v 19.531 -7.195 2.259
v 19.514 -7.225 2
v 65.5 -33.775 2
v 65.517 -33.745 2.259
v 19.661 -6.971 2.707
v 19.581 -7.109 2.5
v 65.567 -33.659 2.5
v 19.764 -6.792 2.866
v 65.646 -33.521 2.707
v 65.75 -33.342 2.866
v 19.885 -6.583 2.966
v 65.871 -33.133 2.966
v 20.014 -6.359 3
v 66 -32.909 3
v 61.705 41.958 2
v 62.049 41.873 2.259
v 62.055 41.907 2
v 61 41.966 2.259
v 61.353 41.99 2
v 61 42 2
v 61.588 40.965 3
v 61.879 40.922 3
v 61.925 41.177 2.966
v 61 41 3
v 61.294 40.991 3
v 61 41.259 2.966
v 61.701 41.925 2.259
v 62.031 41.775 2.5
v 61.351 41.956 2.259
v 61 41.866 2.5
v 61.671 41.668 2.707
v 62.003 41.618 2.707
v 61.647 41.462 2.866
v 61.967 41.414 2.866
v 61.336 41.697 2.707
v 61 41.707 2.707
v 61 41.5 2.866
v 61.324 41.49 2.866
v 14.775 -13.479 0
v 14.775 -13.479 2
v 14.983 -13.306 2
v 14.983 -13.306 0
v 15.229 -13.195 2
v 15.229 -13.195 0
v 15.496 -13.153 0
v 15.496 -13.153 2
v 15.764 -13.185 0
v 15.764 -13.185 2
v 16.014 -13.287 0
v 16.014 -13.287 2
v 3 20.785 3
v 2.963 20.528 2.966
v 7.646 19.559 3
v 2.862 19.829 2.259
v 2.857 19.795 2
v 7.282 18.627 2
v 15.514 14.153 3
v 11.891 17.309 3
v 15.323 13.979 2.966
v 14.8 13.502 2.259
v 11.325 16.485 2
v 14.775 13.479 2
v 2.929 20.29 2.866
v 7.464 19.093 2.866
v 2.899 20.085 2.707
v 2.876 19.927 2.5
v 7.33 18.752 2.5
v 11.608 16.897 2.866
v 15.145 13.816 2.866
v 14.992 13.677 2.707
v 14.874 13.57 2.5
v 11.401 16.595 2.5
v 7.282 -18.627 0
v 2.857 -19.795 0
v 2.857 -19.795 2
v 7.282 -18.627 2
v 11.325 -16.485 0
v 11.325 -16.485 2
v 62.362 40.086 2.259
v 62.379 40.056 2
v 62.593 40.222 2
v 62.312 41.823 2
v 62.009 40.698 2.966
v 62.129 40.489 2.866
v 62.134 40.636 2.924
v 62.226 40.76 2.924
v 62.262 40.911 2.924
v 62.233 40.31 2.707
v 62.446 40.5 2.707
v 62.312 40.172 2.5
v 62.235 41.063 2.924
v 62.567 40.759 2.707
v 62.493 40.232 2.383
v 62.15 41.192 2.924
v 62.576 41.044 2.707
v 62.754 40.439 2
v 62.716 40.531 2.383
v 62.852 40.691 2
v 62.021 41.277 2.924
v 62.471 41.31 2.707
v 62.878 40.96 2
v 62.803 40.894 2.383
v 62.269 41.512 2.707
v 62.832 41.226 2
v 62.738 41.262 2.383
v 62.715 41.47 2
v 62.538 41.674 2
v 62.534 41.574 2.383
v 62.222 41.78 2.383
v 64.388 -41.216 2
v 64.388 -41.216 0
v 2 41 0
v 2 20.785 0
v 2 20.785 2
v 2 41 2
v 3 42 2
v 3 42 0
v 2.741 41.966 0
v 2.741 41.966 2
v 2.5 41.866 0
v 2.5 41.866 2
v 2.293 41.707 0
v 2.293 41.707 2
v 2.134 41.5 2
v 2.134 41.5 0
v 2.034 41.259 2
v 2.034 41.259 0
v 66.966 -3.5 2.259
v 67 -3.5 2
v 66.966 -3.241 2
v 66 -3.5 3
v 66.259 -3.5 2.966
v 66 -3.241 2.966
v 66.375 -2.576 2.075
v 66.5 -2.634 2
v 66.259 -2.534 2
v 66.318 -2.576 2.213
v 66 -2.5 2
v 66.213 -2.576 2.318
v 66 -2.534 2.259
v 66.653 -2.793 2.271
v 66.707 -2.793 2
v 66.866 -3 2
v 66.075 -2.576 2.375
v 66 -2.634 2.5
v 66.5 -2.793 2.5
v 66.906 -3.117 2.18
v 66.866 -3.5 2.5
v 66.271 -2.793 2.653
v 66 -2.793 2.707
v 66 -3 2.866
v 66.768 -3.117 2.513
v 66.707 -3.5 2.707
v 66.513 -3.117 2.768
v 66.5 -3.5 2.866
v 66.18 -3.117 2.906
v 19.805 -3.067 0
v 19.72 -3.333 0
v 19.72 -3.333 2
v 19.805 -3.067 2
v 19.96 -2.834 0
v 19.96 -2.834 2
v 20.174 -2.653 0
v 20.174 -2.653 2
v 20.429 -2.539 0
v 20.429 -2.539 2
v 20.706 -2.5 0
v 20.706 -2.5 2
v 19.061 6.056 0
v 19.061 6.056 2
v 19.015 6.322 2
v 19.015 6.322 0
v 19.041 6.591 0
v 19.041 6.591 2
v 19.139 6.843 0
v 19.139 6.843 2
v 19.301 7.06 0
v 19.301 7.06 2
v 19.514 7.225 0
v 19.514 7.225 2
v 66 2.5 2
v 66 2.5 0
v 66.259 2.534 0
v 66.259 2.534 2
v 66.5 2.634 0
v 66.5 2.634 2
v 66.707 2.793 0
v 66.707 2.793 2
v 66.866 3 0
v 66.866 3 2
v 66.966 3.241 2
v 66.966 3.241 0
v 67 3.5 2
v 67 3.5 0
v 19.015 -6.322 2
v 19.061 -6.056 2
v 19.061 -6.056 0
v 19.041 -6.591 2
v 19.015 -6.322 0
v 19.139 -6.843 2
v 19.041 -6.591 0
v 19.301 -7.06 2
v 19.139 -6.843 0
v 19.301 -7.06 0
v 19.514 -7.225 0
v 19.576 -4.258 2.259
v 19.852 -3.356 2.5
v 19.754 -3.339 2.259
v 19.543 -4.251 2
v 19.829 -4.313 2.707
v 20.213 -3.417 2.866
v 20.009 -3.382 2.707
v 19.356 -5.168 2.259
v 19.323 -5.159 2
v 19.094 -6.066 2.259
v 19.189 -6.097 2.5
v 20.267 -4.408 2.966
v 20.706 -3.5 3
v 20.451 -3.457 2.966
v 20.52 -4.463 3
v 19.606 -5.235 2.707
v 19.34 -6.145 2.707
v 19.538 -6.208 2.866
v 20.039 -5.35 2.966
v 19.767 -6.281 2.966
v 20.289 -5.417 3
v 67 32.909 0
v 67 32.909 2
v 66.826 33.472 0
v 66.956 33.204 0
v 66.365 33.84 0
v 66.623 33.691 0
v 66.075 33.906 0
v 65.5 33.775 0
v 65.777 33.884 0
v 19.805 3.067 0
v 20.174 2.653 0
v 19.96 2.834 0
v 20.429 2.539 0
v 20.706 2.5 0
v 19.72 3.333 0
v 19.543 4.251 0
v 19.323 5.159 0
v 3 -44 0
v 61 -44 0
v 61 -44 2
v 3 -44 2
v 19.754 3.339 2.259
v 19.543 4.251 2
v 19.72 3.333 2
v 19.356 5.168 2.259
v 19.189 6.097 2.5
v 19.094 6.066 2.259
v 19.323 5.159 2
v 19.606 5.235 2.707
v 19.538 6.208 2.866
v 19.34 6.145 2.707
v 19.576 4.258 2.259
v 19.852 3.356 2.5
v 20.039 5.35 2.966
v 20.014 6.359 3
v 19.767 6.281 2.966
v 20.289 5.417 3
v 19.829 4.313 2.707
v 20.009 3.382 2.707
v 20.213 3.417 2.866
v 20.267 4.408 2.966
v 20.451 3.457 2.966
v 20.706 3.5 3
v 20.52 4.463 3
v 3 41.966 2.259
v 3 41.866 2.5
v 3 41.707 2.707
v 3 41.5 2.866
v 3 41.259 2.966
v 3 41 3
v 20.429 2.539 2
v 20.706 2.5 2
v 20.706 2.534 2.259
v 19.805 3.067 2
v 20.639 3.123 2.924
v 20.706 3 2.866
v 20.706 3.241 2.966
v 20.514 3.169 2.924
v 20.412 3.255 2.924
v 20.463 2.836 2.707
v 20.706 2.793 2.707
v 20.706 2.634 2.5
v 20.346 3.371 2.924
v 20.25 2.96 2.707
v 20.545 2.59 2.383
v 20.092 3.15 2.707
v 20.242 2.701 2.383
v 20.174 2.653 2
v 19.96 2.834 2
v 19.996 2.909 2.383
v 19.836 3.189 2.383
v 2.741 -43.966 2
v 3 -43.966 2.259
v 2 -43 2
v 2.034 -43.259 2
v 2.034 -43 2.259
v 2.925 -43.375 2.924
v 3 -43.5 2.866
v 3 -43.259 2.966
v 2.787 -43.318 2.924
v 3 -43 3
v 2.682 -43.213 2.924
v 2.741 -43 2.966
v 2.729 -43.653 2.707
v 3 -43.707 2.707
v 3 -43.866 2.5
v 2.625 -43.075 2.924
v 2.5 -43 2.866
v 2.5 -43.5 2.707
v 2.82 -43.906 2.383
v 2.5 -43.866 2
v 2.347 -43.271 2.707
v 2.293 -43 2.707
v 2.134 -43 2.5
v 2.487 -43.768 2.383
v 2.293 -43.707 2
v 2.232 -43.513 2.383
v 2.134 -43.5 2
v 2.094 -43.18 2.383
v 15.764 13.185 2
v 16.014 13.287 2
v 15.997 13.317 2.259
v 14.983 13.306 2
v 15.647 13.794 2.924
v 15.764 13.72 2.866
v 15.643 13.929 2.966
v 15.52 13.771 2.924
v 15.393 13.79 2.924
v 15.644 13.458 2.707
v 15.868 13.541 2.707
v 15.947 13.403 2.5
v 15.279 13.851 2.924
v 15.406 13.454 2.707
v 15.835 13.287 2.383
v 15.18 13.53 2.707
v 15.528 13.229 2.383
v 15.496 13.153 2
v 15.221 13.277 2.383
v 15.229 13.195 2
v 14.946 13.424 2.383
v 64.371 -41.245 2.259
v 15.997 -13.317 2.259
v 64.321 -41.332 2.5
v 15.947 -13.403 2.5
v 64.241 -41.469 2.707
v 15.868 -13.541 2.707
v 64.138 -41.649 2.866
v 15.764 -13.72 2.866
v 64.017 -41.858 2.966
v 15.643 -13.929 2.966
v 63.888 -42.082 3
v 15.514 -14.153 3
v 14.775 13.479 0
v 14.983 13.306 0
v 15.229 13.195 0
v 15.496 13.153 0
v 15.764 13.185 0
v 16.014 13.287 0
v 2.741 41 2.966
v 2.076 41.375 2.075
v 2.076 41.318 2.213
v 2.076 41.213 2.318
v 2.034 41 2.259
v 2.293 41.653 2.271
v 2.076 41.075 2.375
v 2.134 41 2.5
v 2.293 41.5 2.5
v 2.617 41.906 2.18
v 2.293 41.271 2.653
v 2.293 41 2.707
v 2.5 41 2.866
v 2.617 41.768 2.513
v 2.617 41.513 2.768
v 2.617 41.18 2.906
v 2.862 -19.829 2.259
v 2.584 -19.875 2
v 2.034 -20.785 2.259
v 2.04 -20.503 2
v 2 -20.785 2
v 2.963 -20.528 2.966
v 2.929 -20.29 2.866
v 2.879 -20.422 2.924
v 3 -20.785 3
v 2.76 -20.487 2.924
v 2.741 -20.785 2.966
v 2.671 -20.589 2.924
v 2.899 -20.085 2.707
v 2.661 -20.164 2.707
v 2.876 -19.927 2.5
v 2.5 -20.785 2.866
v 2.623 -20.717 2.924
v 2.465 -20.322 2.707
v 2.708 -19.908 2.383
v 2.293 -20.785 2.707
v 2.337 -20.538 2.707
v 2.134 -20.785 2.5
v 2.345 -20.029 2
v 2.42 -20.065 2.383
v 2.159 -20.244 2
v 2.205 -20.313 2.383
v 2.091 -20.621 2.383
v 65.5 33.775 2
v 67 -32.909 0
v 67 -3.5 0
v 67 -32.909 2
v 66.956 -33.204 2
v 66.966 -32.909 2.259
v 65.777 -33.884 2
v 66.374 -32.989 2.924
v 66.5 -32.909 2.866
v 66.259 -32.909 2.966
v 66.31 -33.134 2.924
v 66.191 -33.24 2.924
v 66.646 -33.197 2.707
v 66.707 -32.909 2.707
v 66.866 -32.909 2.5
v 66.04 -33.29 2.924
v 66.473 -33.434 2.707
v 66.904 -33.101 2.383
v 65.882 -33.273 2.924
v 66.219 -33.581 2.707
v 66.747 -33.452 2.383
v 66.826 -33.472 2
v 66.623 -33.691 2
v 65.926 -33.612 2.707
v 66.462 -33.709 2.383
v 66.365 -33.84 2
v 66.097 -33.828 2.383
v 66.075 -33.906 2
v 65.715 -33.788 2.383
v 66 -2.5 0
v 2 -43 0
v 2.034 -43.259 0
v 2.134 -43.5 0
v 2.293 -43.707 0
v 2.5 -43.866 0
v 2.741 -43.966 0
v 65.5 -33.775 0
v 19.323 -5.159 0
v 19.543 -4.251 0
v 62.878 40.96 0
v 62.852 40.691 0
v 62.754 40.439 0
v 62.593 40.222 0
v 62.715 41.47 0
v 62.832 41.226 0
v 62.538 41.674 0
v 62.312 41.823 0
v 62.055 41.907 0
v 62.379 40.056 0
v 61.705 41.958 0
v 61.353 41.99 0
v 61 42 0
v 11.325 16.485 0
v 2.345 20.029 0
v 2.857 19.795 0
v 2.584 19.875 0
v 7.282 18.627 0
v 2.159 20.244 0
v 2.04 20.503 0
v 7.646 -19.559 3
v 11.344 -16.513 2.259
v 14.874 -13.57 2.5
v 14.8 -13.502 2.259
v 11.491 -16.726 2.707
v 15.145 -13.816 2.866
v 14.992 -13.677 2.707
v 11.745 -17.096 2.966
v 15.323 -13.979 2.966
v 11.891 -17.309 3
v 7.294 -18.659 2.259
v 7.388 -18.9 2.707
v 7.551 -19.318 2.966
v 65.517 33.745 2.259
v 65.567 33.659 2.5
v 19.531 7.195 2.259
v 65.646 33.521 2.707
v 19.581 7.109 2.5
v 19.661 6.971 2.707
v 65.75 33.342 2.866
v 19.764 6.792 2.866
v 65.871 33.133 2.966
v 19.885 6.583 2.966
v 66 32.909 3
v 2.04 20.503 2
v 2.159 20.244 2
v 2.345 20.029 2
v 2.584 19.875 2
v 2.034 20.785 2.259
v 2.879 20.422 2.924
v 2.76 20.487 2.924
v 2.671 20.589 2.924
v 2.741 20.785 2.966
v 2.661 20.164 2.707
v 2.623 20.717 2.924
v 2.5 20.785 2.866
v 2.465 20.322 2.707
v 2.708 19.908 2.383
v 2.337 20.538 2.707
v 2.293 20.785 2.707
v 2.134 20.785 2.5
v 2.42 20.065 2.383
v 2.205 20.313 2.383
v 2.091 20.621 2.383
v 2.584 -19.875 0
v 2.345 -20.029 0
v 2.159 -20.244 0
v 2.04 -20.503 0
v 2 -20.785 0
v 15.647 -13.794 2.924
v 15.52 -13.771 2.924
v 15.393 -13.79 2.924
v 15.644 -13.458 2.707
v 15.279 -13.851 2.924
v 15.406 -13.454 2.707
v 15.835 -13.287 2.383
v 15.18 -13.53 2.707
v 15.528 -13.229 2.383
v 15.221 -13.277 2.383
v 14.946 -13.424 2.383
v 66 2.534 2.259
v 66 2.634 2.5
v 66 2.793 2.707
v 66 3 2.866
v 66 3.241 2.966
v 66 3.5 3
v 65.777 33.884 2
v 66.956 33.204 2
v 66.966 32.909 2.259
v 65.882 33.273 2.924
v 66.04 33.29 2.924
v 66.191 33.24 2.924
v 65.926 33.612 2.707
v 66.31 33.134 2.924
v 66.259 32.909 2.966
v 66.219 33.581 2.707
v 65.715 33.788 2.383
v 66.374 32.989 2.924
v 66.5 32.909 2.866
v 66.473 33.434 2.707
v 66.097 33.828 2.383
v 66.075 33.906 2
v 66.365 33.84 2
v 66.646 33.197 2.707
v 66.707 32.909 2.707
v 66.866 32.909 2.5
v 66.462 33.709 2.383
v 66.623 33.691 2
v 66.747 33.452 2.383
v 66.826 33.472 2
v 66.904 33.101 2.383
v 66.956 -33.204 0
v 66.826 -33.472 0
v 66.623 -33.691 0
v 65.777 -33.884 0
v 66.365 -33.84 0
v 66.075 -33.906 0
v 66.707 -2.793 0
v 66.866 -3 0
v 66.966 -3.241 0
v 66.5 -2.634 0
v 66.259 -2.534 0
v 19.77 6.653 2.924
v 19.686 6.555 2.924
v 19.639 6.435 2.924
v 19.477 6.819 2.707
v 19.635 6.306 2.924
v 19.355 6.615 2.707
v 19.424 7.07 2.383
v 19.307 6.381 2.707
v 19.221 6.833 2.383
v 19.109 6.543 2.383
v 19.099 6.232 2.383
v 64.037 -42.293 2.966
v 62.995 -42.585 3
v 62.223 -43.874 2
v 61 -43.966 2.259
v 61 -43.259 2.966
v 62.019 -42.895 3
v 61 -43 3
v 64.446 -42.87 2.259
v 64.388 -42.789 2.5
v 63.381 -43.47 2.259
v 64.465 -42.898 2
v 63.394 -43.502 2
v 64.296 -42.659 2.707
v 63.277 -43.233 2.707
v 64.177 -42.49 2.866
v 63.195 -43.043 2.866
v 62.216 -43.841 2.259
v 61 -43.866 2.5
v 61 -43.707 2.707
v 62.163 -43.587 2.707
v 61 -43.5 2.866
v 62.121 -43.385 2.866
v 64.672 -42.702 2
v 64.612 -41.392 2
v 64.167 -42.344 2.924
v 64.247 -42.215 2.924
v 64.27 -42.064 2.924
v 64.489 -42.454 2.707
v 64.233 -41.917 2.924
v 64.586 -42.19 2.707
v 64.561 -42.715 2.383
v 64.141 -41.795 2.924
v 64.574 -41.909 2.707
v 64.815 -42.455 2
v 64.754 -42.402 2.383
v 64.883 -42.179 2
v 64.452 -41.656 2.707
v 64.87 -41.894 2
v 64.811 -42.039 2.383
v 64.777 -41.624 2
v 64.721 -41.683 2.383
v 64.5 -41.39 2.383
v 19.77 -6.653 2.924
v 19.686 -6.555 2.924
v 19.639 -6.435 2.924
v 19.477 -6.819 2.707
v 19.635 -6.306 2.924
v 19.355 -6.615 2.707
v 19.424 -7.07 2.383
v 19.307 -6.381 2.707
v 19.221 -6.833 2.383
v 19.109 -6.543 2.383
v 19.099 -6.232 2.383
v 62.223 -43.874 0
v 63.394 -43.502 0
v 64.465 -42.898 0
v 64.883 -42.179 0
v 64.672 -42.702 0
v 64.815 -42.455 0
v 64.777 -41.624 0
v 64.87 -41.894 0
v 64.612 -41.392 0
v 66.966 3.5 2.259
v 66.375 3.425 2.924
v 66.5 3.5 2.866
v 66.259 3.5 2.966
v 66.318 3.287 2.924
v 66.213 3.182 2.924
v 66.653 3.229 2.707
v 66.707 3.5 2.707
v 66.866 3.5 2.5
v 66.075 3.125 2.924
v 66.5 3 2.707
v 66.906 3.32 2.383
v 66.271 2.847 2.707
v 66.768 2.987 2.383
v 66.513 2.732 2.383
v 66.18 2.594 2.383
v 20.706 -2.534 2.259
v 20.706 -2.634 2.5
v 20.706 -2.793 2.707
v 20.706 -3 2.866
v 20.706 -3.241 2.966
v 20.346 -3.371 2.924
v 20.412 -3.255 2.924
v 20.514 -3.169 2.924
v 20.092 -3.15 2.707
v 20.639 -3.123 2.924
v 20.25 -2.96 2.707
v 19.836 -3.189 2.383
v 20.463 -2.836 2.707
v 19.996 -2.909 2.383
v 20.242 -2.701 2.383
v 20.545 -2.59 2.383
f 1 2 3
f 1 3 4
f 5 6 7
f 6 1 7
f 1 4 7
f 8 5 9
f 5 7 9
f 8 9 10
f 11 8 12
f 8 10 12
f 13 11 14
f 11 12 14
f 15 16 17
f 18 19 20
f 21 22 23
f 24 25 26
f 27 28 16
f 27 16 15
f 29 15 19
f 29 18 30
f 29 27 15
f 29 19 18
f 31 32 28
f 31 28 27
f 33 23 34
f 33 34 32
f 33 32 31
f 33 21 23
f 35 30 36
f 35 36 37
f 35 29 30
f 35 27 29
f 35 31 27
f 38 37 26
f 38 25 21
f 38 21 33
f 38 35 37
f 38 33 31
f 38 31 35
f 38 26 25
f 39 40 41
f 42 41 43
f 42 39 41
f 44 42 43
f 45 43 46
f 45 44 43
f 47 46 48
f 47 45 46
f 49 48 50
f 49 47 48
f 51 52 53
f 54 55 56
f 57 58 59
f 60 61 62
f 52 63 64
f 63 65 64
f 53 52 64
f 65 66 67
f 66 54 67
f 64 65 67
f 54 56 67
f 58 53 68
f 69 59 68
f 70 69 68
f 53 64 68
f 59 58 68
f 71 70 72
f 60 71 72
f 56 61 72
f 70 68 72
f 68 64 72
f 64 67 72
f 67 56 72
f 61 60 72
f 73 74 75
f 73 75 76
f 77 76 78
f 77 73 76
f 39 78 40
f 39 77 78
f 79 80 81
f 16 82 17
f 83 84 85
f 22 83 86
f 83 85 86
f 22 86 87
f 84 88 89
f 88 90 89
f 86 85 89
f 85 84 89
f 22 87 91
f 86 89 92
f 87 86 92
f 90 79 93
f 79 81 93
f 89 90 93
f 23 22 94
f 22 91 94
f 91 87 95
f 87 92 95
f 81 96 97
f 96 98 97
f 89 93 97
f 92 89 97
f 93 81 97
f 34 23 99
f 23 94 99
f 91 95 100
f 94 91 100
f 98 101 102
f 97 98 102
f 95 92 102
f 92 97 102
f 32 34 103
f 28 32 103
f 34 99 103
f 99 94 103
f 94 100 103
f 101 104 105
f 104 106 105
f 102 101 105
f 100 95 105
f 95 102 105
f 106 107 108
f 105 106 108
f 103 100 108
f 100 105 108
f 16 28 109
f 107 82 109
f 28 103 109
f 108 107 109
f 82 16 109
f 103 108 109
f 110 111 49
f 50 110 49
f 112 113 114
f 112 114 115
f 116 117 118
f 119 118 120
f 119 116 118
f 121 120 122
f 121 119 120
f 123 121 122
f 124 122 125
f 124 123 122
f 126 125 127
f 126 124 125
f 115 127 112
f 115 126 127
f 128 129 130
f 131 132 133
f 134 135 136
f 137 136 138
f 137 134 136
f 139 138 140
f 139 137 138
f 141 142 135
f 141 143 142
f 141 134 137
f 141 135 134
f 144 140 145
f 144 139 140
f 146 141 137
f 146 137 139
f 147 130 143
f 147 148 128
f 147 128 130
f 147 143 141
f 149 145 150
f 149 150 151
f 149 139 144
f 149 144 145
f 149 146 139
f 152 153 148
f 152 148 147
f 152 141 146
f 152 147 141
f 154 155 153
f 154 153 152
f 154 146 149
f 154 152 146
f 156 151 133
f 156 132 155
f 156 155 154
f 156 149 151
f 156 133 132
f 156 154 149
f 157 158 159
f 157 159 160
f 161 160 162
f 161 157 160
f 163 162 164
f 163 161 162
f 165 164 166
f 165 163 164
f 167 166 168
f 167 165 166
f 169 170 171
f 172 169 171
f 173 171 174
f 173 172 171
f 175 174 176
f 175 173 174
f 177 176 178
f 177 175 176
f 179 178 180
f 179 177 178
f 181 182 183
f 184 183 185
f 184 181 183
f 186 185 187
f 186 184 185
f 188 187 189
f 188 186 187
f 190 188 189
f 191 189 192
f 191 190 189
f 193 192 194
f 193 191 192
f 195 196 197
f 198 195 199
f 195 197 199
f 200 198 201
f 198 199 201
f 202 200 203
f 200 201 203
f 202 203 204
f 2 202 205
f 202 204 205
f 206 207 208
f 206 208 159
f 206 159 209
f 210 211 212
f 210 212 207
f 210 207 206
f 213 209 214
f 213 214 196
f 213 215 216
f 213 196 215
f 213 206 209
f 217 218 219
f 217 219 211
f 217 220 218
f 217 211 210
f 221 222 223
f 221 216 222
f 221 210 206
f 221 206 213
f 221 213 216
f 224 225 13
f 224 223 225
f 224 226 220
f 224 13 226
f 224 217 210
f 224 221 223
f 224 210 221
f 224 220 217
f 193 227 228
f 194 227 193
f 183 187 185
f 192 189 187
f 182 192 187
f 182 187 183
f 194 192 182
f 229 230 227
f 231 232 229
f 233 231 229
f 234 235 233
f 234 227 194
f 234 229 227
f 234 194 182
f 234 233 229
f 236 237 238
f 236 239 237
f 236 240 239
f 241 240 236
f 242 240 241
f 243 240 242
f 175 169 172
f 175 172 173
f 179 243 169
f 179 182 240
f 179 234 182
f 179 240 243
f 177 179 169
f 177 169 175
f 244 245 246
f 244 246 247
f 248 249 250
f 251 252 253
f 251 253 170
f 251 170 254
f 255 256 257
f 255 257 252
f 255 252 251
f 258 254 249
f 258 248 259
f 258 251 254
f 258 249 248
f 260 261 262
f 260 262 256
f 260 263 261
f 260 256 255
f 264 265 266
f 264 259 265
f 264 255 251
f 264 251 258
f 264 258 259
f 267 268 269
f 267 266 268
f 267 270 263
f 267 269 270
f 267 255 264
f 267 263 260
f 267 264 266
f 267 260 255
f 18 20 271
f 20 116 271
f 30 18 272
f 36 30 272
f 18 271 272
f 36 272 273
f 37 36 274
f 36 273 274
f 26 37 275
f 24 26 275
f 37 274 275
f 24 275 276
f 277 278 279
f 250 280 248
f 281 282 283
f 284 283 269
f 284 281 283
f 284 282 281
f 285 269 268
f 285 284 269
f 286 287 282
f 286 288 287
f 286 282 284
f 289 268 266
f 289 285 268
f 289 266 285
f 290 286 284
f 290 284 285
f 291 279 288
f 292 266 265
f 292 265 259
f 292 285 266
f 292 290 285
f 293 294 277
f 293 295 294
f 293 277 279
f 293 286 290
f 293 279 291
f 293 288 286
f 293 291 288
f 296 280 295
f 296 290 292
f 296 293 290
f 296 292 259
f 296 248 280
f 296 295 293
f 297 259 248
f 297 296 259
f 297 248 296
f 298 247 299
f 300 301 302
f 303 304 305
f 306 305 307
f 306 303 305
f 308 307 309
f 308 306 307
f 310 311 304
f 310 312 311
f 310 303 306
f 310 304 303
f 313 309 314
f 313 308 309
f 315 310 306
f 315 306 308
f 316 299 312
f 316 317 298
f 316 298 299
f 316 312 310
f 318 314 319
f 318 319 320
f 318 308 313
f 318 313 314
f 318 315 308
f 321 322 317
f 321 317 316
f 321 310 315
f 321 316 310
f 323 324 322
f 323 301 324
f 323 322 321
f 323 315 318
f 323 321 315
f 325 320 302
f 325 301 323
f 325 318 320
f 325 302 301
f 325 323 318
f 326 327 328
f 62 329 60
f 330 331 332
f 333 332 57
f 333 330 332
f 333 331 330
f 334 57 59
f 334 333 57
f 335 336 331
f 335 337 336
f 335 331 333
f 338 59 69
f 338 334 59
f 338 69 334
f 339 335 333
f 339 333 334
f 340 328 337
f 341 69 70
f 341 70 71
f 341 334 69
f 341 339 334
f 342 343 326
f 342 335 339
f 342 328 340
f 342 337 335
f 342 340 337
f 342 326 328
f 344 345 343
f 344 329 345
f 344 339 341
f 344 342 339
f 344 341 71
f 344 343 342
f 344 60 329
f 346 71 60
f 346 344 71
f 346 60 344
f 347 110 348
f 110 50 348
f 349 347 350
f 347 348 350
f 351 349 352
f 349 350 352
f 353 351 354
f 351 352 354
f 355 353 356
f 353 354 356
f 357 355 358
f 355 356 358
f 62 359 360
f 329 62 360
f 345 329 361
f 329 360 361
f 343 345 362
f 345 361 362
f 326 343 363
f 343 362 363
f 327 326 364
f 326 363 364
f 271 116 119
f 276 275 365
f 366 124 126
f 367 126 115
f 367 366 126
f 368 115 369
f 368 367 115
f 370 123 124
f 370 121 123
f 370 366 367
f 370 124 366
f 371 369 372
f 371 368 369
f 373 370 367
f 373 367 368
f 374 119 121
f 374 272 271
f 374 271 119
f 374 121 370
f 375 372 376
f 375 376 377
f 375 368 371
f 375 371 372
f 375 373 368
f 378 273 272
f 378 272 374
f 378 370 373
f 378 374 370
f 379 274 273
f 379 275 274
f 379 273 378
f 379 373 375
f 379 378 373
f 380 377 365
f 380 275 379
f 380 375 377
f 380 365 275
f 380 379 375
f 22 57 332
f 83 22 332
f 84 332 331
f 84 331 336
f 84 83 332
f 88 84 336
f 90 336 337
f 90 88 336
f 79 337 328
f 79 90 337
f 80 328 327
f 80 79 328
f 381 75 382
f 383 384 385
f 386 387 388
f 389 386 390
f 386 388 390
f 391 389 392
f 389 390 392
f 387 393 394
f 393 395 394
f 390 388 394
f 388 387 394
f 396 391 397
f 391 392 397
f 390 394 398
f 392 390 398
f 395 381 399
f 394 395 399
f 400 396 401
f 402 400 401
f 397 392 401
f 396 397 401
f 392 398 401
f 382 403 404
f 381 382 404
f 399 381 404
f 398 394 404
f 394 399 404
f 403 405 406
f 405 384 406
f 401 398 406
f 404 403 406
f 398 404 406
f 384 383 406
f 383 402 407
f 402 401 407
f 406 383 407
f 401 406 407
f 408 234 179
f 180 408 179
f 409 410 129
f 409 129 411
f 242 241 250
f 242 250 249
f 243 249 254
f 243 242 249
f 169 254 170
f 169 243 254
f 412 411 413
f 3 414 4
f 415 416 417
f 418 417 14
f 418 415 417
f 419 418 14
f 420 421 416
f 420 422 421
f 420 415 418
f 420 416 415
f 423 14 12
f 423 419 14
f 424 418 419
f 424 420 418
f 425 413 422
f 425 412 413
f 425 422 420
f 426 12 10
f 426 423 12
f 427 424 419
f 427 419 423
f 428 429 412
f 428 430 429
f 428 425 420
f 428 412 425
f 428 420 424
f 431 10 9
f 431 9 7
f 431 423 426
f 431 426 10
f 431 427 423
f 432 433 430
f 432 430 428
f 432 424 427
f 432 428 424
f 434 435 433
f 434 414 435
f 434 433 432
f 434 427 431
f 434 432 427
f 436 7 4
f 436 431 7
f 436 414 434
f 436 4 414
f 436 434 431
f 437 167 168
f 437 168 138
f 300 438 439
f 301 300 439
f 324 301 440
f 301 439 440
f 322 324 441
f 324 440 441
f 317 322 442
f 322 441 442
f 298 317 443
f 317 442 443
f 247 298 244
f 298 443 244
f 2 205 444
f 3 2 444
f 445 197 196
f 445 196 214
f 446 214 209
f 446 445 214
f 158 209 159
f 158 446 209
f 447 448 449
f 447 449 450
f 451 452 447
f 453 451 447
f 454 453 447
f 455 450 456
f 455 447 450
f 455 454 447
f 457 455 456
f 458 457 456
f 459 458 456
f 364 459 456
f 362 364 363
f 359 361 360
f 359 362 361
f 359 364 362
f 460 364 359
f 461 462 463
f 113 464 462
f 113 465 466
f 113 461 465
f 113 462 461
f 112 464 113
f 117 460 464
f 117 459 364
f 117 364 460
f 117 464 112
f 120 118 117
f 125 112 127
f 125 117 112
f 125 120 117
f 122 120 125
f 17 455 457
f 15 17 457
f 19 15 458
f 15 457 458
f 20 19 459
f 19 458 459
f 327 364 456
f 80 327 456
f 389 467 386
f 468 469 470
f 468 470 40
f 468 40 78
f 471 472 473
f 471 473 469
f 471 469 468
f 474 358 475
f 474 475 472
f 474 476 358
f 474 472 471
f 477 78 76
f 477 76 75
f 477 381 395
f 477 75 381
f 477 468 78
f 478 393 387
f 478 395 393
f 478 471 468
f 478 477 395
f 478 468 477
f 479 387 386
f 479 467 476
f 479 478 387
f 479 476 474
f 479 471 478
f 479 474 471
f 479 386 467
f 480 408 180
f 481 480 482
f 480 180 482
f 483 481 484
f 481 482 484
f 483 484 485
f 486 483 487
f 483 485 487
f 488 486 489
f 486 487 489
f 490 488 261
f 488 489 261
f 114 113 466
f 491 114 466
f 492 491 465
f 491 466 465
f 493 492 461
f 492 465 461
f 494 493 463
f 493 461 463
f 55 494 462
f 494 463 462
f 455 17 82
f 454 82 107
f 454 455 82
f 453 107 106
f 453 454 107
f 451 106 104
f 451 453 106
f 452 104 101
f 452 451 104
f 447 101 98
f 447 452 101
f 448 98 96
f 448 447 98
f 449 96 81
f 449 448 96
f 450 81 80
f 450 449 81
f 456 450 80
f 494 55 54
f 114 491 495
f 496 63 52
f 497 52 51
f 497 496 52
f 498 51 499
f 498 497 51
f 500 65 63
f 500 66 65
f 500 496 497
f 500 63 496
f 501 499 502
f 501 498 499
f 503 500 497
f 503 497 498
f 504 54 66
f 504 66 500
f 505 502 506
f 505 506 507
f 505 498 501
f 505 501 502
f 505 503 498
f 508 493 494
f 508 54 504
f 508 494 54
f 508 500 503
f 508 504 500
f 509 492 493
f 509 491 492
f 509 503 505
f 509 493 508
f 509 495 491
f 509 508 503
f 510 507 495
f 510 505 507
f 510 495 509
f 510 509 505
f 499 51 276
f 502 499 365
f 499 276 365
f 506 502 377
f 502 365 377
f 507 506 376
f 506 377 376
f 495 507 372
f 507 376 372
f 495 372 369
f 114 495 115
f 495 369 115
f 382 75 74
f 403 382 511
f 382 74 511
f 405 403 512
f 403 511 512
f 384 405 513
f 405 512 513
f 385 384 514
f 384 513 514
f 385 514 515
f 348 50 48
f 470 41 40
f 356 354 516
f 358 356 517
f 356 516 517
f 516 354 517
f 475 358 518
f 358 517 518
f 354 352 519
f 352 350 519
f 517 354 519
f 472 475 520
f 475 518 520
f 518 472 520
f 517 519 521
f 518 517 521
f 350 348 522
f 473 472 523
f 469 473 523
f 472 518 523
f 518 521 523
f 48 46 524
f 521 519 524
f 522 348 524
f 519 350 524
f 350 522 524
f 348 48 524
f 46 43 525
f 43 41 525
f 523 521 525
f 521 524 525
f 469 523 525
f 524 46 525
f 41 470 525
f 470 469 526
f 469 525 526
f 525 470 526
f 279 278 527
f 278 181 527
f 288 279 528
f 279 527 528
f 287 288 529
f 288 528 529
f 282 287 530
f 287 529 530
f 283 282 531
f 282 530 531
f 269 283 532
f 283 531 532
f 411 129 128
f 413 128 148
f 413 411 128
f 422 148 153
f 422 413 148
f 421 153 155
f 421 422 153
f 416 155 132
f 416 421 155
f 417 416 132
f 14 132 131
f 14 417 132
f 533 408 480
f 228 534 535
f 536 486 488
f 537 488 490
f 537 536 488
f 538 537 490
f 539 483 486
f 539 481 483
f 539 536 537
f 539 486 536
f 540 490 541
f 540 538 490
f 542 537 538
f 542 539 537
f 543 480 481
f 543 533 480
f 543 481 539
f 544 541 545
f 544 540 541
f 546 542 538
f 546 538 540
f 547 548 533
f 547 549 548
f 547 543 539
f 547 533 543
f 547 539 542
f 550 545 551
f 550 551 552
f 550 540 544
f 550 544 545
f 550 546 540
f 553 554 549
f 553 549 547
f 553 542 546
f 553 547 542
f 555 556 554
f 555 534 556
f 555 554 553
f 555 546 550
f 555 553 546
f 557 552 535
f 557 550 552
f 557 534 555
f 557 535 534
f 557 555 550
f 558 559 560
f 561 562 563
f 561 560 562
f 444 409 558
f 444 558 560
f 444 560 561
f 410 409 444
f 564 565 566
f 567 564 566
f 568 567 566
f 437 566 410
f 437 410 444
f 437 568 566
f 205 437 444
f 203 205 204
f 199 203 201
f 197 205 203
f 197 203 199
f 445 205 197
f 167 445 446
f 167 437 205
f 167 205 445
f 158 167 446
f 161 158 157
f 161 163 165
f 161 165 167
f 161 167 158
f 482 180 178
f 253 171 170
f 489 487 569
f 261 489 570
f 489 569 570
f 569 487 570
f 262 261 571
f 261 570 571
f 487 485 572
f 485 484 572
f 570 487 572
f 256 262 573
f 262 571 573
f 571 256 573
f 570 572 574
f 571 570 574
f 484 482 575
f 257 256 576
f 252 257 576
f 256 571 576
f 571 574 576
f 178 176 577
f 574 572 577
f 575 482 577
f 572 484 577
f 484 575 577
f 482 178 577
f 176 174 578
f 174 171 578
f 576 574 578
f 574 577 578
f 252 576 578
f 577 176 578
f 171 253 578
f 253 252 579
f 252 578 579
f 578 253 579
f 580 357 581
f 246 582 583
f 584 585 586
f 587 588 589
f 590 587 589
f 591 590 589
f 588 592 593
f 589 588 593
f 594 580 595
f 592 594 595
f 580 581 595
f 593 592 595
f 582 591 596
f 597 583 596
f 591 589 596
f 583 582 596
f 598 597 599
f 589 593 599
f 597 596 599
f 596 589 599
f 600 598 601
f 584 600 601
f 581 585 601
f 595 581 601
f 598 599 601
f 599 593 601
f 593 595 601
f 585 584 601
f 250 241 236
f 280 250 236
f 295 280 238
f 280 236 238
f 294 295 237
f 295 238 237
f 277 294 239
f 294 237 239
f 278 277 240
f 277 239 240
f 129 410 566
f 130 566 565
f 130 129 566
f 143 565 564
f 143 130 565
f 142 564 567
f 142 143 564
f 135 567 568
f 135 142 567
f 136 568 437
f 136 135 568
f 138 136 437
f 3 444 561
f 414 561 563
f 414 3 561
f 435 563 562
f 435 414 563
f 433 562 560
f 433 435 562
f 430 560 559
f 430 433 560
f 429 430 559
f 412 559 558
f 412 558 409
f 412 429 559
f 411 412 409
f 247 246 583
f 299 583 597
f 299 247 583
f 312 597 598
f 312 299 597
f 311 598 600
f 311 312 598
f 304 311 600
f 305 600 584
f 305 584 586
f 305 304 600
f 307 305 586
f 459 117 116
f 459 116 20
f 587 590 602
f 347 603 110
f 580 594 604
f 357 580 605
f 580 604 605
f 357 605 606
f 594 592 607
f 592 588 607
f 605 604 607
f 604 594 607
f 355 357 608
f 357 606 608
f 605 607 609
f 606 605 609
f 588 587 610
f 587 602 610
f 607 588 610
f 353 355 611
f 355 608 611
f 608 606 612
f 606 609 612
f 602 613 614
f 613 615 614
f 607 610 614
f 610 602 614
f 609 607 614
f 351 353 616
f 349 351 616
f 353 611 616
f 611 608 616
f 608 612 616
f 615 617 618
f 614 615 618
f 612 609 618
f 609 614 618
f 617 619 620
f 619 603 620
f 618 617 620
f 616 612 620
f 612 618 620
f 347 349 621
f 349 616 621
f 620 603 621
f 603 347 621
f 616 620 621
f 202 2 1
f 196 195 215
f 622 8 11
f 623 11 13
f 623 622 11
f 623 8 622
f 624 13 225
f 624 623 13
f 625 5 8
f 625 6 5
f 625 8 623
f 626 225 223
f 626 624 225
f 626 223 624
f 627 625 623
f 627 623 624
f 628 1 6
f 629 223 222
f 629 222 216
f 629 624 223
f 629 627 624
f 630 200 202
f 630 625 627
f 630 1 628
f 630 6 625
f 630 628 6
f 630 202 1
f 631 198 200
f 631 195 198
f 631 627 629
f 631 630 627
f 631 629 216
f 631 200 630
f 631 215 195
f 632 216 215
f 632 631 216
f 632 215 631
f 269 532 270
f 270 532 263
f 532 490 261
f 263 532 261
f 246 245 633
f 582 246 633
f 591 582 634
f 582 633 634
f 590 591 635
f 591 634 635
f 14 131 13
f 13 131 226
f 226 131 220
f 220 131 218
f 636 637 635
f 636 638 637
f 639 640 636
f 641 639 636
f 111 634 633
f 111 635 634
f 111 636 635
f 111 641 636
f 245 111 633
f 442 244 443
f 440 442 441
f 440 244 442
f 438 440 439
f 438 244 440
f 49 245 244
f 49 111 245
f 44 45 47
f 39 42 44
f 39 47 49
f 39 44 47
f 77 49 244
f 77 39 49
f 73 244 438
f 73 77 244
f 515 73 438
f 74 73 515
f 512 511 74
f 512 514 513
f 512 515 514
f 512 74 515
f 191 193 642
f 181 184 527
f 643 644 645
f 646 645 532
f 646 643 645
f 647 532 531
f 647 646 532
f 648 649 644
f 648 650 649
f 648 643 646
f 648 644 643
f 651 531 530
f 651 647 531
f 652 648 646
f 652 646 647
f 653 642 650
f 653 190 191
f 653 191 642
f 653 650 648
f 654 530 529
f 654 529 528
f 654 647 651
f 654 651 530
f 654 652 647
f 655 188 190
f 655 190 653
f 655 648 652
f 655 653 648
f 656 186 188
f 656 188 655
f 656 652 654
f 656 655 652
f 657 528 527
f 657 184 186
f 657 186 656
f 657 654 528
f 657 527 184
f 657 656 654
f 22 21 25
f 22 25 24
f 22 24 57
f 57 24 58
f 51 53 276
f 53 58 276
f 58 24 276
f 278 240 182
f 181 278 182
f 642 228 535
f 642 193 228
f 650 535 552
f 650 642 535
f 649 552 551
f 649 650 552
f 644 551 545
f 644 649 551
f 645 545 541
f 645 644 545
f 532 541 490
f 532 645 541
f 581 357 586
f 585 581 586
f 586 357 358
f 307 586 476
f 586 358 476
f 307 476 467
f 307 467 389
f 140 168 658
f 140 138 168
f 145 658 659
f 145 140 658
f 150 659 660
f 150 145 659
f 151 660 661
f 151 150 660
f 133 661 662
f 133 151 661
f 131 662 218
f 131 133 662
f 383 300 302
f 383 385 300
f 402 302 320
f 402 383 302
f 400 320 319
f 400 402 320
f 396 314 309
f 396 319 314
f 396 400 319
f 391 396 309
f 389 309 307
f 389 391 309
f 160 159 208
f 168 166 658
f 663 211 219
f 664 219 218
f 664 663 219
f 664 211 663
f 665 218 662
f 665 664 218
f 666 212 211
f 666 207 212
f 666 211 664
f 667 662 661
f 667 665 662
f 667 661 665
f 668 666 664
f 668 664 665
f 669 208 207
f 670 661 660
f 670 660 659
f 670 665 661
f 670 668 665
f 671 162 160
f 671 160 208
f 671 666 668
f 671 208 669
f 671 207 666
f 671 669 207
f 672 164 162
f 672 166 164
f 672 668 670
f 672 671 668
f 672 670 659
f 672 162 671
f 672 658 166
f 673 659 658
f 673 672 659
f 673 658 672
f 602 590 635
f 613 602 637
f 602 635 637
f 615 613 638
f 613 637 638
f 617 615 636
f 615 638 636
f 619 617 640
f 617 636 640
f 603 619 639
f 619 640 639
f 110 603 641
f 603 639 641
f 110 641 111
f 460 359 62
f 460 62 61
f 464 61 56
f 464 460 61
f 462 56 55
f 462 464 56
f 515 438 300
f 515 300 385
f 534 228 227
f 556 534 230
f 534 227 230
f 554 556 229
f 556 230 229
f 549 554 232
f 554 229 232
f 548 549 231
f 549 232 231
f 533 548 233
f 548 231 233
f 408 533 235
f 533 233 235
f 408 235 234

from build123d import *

# Parameters (mm, degrees)
SKETCH007_W   = 2
SKETCH007_H   = 82
SKETCH007_W_2 = 81.968745
SKETCH007_H_2 = 5
PAD008_DEPTH  = 10
SKETCH009_R   = 20
PAD007_DEPTH  = 10
PAD006_DEPTH  = 3
FILLET002_R   = 1


with BuildPart() as mr_ribs001:
    # Sketch007 → Pad008 (new body)
    with BuildSketch(Plane.XY):
        with Locations((1, 59)):
            Rectangle(SKETCH007_W, SKETCH007_H)
        Polygon((13.540929, 11.859311), (84.79948, 53.000455), (88.29948, 46.938277), (17.040929, 5.797133), align=None)
        with Locations((58.984372, 0)):
            Rectangle(SKETCH007_W_2, SKETCH007_H_2)
        Polygon((17.040929, -5.797133), (88.29948, -46.938277), (84.79948, -53.000455), (13.540929, -11.859311), align=None)
        with Locations((1, -59)):
            Rectangle(SKETCH007_W, SKETCH007_H)
    extrude(amount=PAD008_DEPTH)


with BuildPart() as mr_lens001:
    # Sketch009 → Pad007 (new body)
    with BuildSketch(Plane.XY):
        Circle(SKETCH009_R)
    extrude(amount=PAD007_DEPTH)


with BuildPart() as mr_tool:
    # Sketch008 → Pad006 (new body)
    with BuildSketch(Plane.XY):
        with BuildLine():
            Line((0, 42), (61, 42))
            ThreePointArc((67, 36), (65.242641, 40.242641), (61, 42))
            Line((67, 36), (67, -38))
            ThreePointArc((61, -44), (65.242641, -42.242641), (67, -38))
            Line((61, -44), (0, -44))
            Line((0, -44), (0, 42))
        make_face()
    extrude(amount=PAD006_DEPTH)

    # Cut001: cut MR_Lens001
    add(mr_lens001.part, mode=Mode.SUBTRACT)

    # Cut002: cut MR_Ribs001
    add(mr_ribs001.part, mode=Mode.SUBTRACT)

    # Fillet002
    fillet002_edges = [mr_tool.edges().sort_by_distance(p)[0] for p in [
        (2, -44, 1.5),
        (31.5, -44, 3),
        (2, -31.949874, 3),
        (2, -19.899749, 1.5),
        (63.513057, -43.448353, 3),
        (40.433616, -27.385811, 3),
        (9.337074, -17.686691, 3),
        (65.564006, -41.894849, 1.5),
        (15.303226, -12.876773, 1.5),
        (67, -34.641016, 1.5),
        (67, -18.570508, 3),
        (67, -2.5, 1.5),
        (43.421567, -2.5, 3),
        (19.843135, -2.5, 1.5),
        (19.443231, -4.686232, 3),
        (18.803226, -6.814595, 1.5),
        (42.901613, -20.727806, 3),
        (67, 2.5, 1.5),
        (67, 18.570508, 3),
        (67, 34.641016, 1.5),
        (18.803226, 6.814595, 1.5),
        (42.901613, 20.727806, 3),
        (19.443231, 4.686232, 3),
        (19.843135, 2.5, 1.5),
        (43.421567, 2.5, 3),
        (62.650417, 41.768546, 3),
        (64.173503, 41.092041, 1.5),
        (31.5, 42, 3),
        (2, 42, 1.5),
        (2, 30.949874, 3),
        (2, 19.899749, 1.5),
        (9.337074, 17.686691, 3),
        (15.303226, 12.876773, 1.5),
        (39.738364, 26.984407, 3),
    ]]
    fillet(fillet002_edges, radius=FILLET002_R)


solid = mr_tool.part
